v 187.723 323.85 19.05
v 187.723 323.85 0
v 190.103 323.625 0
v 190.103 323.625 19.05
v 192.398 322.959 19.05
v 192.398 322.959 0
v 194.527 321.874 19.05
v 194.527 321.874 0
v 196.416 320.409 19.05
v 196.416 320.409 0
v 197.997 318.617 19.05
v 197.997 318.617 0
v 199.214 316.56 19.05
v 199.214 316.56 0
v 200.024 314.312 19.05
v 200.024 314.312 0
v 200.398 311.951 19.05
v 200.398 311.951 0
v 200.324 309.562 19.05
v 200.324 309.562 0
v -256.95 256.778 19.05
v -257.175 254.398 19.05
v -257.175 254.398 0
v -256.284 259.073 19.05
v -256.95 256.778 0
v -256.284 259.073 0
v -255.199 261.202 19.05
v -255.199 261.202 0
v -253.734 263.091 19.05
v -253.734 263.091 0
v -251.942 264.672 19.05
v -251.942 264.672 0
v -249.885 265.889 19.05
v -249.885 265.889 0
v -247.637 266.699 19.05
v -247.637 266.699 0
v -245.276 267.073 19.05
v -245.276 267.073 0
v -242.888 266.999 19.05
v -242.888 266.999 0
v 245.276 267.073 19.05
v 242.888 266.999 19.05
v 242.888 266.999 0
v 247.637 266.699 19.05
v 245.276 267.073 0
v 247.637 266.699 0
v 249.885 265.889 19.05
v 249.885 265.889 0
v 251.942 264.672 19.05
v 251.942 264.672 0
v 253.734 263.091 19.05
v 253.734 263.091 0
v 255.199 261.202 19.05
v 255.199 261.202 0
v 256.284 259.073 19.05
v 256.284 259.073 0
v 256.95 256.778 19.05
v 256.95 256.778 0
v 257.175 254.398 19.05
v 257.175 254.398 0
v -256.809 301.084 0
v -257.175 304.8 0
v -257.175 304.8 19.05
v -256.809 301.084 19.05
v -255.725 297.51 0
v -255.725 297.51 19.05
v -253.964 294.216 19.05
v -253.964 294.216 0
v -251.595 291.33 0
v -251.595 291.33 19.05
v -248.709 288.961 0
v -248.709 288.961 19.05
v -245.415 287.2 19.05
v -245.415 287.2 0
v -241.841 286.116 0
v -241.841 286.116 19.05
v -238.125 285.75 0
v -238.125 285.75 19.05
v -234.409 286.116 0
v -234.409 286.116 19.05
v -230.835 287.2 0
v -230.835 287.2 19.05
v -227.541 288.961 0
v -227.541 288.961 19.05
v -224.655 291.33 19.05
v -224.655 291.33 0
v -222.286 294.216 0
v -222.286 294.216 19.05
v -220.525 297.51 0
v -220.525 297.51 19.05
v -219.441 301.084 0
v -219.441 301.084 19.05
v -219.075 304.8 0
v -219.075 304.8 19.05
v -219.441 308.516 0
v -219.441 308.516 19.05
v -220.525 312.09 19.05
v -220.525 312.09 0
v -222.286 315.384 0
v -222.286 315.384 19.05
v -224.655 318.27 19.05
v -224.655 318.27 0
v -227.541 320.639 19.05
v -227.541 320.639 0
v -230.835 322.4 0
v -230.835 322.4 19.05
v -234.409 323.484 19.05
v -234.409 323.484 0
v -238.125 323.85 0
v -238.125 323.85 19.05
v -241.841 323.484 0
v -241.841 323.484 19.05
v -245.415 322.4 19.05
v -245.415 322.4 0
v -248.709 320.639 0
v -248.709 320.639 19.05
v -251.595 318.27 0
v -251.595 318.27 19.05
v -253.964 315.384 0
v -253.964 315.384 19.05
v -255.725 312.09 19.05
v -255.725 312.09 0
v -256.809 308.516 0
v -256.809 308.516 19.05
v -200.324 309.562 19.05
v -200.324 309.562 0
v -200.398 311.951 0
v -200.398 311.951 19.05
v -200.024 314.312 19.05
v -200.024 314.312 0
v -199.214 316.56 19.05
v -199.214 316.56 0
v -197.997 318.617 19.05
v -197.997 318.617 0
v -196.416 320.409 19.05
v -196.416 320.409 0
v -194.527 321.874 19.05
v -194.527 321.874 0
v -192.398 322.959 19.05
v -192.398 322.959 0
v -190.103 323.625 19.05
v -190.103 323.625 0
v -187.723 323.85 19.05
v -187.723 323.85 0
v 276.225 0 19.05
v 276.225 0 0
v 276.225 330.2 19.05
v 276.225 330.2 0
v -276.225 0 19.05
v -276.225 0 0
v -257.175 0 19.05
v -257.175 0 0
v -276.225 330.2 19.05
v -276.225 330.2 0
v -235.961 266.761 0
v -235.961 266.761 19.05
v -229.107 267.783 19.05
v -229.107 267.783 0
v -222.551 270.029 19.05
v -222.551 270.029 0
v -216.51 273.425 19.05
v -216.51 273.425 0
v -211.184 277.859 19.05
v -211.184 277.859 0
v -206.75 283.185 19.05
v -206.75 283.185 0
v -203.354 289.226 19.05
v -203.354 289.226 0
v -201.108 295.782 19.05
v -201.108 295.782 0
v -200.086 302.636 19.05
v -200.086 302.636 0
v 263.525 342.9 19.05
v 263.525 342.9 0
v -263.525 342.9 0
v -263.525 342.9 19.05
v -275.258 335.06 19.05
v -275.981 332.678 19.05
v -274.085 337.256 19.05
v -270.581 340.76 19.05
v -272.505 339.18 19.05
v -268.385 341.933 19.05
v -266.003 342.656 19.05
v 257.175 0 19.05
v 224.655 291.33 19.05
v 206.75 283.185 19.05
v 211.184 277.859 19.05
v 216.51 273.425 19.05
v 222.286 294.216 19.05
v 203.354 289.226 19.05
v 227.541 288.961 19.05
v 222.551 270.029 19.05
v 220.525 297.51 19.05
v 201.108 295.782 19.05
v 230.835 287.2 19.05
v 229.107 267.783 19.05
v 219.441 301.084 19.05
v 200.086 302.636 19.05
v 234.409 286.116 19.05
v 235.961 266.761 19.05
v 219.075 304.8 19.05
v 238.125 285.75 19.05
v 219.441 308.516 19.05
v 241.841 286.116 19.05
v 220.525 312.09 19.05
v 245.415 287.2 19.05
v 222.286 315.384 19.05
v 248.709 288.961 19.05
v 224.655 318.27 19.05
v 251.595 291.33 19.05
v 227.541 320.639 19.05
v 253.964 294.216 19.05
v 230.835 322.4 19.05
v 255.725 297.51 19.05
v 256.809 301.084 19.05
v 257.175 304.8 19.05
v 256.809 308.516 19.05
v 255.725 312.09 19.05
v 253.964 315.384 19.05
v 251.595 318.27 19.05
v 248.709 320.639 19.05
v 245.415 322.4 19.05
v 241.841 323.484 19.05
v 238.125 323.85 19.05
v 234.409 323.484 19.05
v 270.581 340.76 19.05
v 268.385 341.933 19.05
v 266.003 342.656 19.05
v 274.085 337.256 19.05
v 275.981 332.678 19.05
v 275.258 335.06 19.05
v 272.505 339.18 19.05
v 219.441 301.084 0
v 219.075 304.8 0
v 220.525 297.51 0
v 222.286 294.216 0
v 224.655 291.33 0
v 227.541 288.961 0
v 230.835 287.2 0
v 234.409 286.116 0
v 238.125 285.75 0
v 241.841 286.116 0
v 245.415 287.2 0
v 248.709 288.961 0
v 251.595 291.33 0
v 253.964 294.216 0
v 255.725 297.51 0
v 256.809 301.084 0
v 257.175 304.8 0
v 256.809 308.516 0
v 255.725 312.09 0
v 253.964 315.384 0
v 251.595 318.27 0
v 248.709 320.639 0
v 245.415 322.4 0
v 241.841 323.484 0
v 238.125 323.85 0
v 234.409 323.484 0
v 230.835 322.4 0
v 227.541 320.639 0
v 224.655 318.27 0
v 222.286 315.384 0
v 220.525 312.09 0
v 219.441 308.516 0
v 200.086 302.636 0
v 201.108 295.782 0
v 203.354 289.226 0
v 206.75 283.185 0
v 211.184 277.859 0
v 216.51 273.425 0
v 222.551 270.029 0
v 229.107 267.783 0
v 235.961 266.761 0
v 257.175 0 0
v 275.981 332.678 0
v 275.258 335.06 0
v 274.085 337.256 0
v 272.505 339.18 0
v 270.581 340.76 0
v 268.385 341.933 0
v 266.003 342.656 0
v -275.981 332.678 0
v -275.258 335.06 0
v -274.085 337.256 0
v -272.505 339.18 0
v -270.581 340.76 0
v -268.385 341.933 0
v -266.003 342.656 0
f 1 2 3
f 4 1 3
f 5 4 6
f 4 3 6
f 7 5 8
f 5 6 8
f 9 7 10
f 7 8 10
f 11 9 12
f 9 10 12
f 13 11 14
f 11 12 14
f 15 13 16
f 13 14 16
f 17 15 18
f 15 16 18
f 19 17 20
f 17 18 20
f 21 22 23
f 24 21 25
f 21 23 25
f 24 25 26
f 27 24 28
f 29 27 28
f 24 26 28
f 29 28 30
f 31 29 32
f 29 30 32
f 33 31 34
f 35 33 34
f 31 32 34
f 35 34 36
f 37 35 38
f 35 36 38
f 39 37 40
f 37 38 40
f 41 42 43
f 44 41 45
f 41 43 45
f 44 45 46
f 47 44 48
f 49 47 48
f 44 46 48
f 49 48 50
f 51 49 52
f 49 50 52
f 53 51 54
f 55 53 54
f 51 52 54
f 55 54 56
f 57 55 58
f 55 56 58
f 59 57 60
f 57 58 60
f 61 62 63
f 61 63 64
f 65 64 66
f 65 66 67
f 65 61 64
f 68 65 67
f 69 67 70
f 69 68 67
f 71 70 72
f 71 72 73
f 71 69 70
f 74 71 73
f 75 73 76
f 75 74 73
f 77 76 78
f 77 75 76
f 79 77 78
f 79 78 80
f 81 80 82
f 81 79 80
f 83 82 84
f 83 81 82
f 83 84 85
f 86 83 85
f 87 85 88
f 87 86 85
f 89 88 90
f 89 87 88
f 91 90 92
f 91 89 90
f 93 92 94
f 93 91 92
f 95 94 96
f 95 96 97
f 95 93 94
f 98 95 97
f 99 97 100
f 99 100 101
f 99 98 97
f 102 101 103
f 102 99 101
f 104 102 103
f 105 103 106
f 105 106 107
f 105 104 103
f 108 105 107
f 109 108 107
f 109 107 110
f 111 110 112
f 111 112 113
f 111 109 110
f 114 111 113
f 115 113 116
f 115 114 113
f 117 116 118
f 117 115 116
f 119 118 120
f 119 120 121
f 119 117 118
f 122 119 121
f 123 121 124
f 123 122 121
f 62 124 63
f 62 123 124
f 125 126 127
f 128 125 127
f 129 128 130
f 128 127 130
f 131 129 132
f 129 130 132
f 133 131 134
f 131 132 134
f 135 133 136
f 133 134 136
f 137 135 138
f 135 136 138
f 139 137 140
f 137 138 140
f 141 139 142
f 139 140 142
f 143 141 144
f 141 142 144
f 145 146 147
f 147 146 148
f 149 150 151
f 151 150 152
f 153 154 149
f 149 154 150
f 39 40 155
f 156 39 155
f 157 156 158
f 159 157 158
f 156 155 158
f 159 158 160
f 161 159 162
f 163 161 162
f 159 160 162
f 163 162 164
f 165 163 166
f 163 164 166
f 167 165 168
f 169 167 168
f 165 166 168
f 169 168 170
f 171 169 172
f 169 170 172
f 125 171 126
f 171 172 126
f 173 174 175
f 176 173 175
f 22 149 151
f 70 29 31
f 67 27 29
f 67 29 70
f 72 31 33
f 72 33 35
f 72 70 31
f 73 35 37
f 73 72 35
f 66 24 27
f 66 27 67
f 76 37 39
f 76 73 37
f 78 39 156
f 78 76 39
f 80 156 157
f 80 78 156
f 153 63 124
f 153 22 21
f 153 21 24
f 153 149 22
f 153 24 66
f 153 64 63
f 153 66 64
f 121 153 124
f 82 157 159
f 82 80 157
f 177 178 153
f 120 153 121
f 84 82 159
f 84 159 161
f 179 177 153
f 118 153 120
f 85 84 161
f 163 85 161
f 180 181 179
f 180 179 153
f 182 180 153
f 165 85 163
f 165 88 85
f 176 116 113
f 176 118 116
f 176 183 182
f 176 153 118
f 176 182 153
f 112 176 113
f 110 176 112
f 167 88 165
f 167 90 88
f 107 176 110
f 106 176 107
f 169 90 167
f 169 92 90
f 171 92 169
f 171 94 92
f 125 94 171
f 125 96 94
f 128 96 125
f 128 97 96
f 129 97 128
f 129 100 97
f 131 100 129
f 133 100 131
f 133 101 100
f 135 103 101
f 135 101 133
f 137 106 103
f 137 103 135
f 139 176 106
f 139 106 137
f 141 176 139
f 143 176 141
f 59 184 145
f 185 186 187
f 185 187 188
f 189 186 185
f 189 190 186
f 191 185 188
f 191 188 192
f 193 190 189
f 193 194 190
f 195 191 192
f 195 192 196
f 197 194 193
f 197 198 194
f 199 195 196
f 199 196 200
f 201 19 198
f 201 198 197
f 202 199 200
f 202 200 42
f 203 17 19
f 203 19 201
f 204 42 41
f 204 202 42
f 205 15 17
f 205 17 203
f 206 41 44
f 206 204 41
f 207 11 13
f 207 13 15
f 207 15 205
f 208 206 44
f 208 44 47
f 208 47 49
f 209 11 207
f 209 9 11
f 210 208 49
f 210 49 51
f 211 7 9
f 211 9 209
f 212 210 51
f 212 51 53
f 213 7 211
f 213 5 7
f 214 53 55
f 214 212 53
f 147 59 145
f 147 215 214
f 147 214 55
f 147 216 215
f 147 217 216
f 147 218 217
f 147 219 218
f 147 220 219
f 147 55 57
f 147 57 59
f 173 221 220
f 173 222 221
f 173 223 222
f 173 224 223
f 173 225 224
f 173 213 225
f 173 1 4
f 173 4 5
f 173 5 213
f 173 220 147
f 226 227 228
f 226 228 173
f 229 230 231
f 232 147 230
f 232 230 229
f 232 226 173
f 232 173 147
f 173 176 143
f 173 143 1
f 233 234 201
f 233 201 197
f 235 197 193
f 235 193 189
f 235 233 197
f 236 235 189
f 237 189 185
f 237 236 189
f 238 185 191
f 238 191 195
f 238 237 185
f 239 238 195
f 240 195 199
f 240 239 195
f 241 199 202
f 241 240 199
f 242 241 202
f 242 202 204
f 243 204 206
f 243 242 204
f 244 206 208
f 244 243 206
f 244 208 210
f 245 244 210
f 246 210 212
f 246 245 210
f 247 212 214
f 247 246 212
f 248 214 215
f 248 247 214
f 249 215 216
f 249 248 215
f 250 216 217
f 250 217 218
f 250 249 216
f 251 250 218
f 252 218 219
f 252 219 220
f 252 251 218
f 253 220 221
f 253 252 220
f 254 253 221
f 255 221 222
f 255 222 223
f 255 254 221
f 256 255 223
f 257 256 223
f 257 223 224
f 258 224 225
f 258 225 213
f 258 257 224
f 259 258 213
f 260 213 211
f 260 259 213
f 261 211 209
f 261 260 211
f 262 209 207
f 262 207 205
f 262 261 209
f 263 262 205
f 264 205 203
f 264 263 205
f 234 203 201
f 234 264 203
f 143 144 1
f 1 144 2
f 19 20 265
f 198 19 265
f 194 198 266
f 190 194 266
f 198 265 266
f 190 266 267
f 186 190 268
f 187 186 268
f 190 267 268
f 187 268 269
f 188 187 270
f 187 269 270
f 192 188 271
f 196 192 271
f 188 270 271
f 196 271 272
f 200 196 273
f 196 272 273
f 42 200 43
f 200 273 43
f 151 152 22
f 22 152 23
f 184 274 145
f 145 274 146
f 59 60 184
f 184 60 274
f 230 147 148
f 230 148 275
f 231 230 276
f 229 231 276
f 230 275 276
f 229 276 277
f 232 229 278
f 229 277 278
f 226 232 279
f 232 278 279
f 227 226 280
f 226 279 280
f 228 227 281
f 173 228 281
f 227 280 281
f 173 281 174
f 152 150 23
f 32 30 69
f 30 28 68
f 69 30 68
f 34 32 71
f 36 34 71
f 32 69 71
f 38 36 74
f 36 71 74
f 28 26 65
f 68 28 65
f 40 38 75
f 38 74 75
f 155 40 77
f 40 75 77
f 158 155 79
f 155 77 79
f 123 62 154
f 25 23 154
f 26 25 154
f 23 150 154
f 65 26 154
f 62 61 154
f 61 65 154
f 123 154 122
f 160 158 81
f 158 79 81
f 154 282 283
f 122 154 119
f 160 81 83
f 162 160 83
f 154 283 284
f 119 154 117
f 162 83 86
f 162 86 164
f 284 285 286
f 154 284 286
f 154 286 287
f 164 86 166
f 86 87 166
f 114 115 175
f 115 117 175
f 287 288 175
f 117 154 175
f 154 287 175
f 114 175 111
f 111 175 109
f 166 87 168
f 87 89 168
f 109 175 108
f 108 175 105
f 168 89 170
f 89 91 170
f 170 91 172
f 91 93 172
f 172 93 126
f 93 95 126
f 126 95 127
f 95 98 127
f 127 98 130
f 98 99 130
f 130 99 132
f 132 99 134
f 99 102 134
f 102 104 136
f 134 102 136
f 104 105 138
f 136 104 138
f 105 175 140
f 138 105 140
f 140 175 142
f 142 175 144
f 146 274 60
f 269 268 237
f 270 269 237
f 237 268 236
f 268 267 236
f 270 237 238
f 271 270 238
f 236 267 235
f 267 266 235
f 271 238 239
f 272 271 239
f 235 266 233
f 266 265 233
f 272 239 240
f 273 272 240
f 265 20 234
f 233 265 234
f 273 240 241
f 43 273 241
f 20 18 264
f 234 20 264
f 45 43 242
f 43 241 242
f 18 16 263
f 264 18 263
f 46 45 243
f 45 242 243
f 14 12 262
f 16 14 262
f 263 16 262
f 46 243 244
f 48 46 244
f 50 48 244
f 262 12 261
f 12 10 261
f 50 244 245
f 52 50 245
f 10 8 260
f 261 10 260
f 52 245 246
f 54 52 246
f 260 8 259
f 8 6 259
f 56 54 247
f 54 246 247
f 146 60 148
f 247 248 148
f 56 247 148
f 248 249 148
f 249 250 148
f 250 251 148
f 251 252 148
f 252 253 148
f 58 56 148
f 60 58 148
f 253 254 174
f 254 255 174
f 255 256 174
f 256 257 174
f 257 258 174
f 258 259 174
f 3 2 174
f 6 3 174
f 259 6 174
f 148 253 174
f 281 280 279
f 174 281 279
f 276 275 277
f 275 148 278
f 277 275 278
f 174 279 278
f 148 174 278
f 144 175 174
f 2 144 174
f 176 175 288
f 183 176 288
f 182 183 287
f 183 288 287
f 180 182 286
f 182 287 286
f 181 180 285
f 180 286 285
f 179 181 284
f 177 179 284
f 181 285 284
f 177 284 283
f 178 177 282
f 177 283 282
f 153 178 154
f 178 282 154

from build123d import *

# Parameters (mm, degrees)
SKETCH1_R           = 19.05
BOSS_EXTRUDE1_DEPTH = 19.05


with BuildPart() as part:
    # Sketch1 → Boss-Extrude1 (new body)
    with BuildSketch(Plane.XY):
        with BuildLine():
            Line((276.225, 0), (276.225, 330.2))
            ThreePointArc((276.225, 330.2), (272.505256121, 339.180256121), (263.525, 342.9))
            Line((263.525, 342.9), (-263.525, 342.9))
            ThreePointArc((-263.525, 342.9), (-272.505256121, 339.180256121), (-276.225, 330.2))
            Line((-276.225, 330.2), (-276.225, 0))
            Line((-276.225, 0), (-257.175, 0))
            Line((-257.175, 0), (-257.175, 76.2))
            Line((-257.175, 76.2), (-257.175, 165.1))
            Line((-257.175, 165.1), (-257.175, 254.398437524))
            ThreePointArc((-257.175, 254.398437524), (-252.875260413, 263.923437524), (-242.8875, 266.998828143))
            ThreePointArc((-242.8875, 266.998828143), (-211.184231637, 277.859231637), (-200.323828143, 309.5625))
            ThreePointArc((-200.323828143, 309.5625), (-197.248437524, 319.550260413), (-187.723437524, 323.85))
            Line((-187.723437524, 323.85), (187.723437524, 323.85))
            ThreePointArc((187.723437524, 323.85), (197.248437524, 319.550260413), (200.323828143, 309.5625))
            ThreePointArc((200.323828143, 309.5625), (211.184231637, 277.859231637), (242.8875, 266.998828143))
            ThreePointArc((242.8875, 266.998828143), (252.875260413, 263.923437524), (257.175, 254.398437524))
            Line((257.175, 254.398437524), (257.175, 165.1))
            Line((257.175, 165.1), (257.175, 76.2))
            Line((257.175, 76.2), (257.175, 0))
            Line((257.175, 0), (276.225, 0))
        make_face()
        with Locations(Location((238.125, 304.8, 0), (0, 0, 180))):
            Circle(SKETCH1_R, mode=Mode.SUBTRACT)
        with Locations(Location((-238.125, 304.8, 0), (0, 0, 180))):
            Circle(SKETCH1_R, mode=Mode.SUBTRACT)
    extrude(amount=BOSS_EXTRUDE1_DEPTH)


solid = part.part
